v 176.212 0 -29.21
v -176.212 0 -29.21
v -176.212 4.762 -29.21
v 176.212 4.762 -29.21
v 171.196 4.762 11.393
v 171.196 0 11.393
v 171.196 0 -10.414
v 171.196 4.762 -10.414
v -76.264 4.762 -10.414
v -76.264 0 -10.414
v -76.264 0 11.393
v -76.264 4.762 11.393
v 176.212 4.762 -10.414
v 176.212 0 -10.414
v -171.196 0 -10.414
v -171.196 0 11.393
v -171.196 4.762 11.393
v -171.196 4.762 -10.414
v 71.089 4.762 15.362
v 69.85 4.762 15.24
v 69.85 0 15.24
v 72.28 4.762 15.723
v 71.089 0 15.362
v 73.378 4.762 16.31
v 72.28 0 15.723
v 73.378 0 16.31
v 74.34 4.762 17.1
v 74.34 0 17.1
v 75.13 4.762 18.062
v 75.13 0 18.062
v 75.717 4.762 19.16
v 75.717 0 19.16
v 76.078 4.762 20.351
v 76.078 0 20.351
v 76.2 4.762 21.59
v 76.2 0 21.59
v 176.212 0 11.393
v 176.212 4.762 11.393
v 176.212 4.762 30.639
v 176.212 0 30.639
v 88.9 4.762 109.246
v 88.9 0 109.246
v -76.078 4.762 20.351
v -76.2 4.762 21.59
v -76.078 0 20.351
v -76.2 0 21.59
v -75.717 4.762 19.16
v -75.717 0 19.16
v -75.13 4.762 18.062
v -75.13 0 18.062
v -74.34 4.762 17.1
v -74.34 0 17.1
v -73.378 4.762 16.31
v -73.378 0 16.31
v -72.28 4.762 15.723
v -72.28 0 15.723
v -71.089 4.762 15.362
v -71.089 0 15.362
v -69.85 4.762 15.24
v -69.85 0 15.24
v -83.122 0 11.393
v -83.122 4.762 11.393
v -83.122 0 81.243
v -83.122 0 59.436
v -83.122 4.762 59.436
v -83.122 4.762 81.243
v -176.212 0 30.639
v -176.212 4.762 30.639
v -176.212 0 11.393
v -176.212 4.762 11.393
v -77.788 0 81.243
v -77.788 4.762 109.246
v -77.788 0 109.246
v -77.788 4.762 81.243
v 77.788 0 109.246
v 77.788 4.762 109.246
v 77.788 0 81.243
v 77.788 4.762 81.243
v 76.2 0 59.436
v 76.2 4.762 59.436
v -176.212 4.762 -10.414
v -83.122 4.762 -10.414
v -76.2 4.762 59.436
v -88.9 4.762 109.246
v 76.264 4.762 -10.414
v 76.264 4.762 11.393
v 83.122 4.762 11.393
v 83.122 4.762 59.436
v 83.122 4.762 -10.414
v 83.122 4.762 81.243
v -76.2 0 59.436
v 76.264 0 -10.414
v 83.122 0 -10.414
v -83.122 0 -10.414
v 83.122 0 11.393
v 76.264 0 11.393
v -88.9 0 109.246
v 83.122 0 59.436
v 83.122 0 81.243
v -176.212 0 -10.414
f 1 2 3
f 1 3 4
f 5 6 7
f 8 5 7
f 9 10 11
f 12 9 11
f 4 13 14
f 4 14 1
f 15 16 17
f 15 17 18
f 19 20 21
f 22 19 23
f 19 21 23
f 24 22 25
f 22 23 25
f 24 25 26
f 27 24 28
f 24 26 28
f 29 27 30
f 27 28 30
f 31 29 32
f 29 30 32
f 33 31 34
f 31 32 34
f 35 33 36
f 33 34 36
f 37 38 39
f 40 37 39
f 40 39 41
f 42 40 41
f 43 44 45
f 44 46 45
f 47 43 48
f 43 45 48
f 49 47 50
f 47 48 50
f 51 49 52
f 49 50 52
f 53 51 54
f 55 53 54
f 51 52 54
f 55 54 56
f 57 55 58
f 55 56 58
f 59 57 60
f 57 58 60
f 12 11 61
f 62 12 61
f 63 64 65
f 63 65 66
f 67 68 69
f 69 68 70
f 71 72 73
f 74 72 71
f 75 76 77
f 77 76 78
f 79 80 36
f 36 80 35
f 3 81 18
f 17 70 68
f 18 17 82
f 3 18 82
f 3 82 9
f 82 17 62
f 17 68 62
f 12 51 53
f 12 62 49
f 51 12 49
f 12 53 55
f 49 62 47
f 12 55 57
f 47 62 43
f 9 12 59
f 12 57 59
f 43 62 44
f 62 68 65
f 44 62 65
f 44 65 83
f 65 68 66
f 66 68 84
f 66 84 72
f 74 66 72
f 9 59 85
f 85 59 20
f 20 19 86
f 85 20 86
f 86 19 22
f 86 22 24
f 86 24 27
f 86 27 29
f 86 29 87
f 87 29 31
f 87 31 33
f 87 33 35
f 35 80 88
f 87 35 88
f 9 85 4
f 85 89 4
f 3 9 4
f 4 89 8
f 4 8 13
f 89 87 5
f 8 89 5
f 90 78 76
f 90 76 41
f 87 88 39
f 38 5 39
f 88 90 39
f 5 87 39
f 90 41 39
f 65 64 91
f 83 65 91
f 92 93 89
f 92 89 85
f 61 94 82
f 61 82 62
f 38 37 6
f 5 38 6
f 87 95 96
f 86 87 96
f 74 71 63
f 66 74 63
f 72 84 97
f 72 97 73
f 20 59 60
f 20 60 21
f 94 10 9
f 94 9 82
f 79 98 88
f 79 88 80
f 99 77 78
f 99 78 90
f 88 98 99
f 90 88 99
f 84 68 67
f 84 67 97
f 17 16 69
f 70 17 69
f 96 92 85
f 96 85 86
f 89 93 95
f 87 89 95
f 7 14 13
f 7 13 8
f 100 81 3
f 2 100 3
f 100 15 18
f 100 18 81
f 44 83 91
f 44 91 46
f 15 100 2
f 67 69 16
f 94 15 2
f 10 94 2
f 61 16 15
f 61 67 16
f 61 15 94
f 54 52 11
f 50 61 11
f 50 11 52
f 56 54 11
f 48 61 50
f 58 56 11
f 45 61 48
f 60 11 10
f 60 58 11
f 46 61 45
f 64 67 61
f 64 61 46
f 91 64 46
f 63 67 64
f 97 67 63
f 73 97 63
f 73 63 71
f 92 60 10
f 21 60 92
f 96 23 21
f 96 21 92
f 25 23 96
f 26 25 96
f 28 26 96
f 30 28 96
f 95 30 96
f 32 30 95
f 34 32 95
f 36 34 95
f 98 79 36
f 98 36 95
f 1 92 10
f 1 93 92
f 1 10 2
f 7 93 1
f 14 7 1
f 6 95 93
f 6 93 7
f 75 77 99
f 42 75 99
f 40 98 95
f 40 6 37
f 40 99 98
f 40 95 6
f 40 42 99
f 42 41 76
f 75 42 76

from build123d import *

# Parameters (mm, degrees)
SKETCH1_W           = 355.6
SKETCH1_H           = 58.42
BOSS_EXTRUDE1_DEPTH = 4.7625
BOSS_EXTRUDE2_DEPTH = 4.7625
FILLET1_R           = 3.175
SKETCH3_W           = 6.858
SKETCH3_H           = 21.806929344
SKETCH3_W_2         = 6.35
SKETCH3_H_2         = 21.298929344
CUT_EXTRUDE1_DEPTH  = 209.73467472
SKETCH4_W           = 1.5875
SKETCH4_H           = 18.796
CUT_EXTRUDE2_DEPTH  = 209.73467472
SKETCH5_W           = 1.5875
SKETCH5_H           = 28.002862447
CUT_EXTRUDE3_DEPTH  = 208.38411122
SKETCH6_W           = 0.3175
SKETCH6_H           = 21.806929344
BOSS_EXTRUDE3_DEPTH = 4.7625
SKETCH7_W           = 0.3175
SKETCH7_H           = 21.806929344
CUT_EXTRUDE4_DEPTH  = 208.38411122
SKETCH8_W           = 152.4
SKETCH8_H           = 17.145
CUT_EXTRUDE5_DEPTH  = 208.38411122
FILLET2_R           = 6.35


with BuildPart() as part:
    # Sketch1 → Boss-Extrude1 (new body)
    with BuildSketch(Plane(origin=(0, 0, 0), x_dir=(1, 0, 0), z_dir=(0, 1, 0))):
        Rectangle(SKETCH1_W, SKETCH1_H)
    extrude(amount=BOSS_EXTRUDE1_DEPTH)

    # Sketch2 → Boss-Extrude2 (add)
    with BuildSketch(Plane(origin=(0, 4.7625, 0), x_dir=(1, 0, 0), z_dir=(0, 1, 0))):
        Polygon((177.8, -29.21), (88.9, -109.245791791), (76.2, -109.245791791), (76.2, -29.21), align=None)
        Polygon((-177.8, -29.21), (-88.9, -109.245791791), (-76.2, -109.245791791), (-76.2, -29.21), align=None)
    extrude(amount=-BOSS_EXTRUDE2_DEPTH)

    # Fillet1
    fillet1_edges = [part.edges().sort_by_distance(p)[0] for p in [
        (-76.2, 2.38125, 29.21),
        (76.2, 2.38125, 29.21),
    ]]
    fillet(fillet1_edges, radius=FILLET1_R)

    # Sketch3 → Cut-Extrude1 (cut, through all)
    with BuildSketch(Plane(origin=(0, 0, 0), x_dir=(-1, 0, 0), z_dir=(0, -1, 0))):
        with Locations((-174.625, -0.489464672)):
            Rectangle(SKETCH3_W, SKETCH3_H)
        with Locations((-174.625, -0.489464672)):
            Rectangle(SKETCH3_W_2, SKETCH3_H_2, mode=Mode.SUBTRACT)
        with Locations((-79.375, -0.489464672)):
            Rectangle(SKETCH3_W, SKETCH3_H)
        with Locations((-79.375, -0.489464672)):
            Rectangle(SKETCH3_W_2, SKETCH3_H_2, mode=Mode.SUBTRACT)
        with Locations((-79.375, -70.339464672)):
            Rectangle(SKETCH3_W, SKETCH3_H)
        with Locations((-79.375, -70.339464672)):
            Rectangle(SKETCH3_W_2, SKETCH3_H_2, mode=Mode.SUBTRACT)
        with Locations((79.375, -70.339464672)):
            Rectangle(SKETCH3_W, SKETCH3_H)
        with Locations((79.375, -70.339464672)):
            Rectangle(SKETCH3_W_2, SKETCH3_H_2, mode=Mode.SUBTRACT)
        with Locations((79.375, -0.489464672)):
            Rectangle(SKETCH3_W, SKETCH3_H)
        with Locations((79.375, -0.489464672)):
            Rectangle(SKETCH3_W_2, SKETCH3_H_2, mode=Mode.SUBTRACT)
        with Locations((174.625, -0.489464672)):
            Rectangle(SKETCH3_W, SKETCH3_H)
        with Locations((174.625, -0.489464672)):
            Rectangle(SKETCH3_W_2, SKETCH3_H_2, mode=Mode.SUBTRACT)
    extrude(amount=-CUT_EXTRUDE1_DEPTH, mode=Mode.SUBTRACT)


with BuildPart() as body_2:
    # of the pieces the cut leaves, the one that is kept (cut_extrude1_keep)
    add(part.part.solids().sort_by_distance((76.2, 0, 109.245791791))[0])

    # Sketch4 → Cut-Extrude2 (cut, through all)
    with BuildSketch(Plane(origin=(0, 4.7625, 0), x_dir=(1, 0, 0), z_dir=(0, 1, 0))):
        Polygon((177.8, -11.392929344), (176.2125, -11.392929344), (176.2125, -30.639210568), (177.8, -29.21), align=None)
        with Locations((177.00625, 19.812)):
            Rectangle(SKETCH4_W, SKETCH4_H)
        with Locations((-177.00625, 19.812)):
            Rectangle(SKETCH4_W, SKETCH4_H)
        Polygon((-176.2125, -30.639210568), (-176.2125, -11.392929344), (-177.8, -11.392929344), (-177.8, -29.21), align=None)
    extrude(amount=-CUT_EXTRUDE2_DEPTH, mode=Mode.SUBTRACT)

    # Sketch5 → Cut-Extrude3 (cut, through all)
    with BuildSketch(Plane(origin=(0, 4.7625, 0), x_dir=(1, 0, 0), z_dir=(0, 1, 0))):
        with Locations((-76.99375, -95.244360567)):
            Rectangle(SKETCH5_W, SKETCH5_H)
        with Locations((76.99375, -95.244360567)):
            Rectangle(SKETCH5_W, SKETCH5_H)
    extrude(amount=-CUT_EXTRUDE3_DEPTH, mode=Mode.SUBTRACT)

    # Sketch6 → Boss-Extrude3 (add)
    with BuildSketch(Plane.XZ):
        with Locations((-76.10475, 0.489464672)):
            Rectangle(SKETCH6_W, SKETCH6_H)
        with Locations((76.10475, 0.489464672)):
            Rectangle(SKETCH6_W, SKETCH6_H)
    extrude(amount=-BOSS_EXTRUDE3_DEPTH)

    # Sketch7 → Cut-Extrude4 (cut, through all)
    with BuildSketch(Plane.XZ):
        with Locations((-82.96275, 0.489464672)):
            Rectangle(SKETCH7_W, SKETCH7_H)
        with Locations((-82.96275, 70.339464672)):
            Rectangle(SKETCH7_W, SKETCH7_H)
        with Locations((82.96275, 70.339464672)):
            Rectangle(SKETCH7_W, SKETCH7_H)
        with Locations((82.96275, 0.489464672)):
            Rectangle(SKETCH7_W, SKETCH7_H)
    extrude(amount=-CUT_EXTRUDE4_DEPTH, mode=Mode.SUBTRACT)

    # Sketch8 → Cut-Extrude5 (cut, through all)
    with BuildSketch(Plane(origin=(0, 4.7625, 0), x_dir=(1, 0, 0), z_dir=(0, 1, 0))):
        with Locations((0, -23.8125)):
            Rectangle(SKETCH8_W, SKETCH8_H)
    extrude(amount=-CUT_EXTRUDE5_DEPTH, mode=Mode.SUBTRACT)

    # Fillet2
    fillet2_edges = [body_2.edges().sort_by_distance(p)[0] for p in [
        (76.2, 2.38125, 15.24),
        (-76.2, 2.38125, 15.24),
    ]]
    fillet(fillet2_edges, radius=FILLET2_R)


solid = body_2.part
